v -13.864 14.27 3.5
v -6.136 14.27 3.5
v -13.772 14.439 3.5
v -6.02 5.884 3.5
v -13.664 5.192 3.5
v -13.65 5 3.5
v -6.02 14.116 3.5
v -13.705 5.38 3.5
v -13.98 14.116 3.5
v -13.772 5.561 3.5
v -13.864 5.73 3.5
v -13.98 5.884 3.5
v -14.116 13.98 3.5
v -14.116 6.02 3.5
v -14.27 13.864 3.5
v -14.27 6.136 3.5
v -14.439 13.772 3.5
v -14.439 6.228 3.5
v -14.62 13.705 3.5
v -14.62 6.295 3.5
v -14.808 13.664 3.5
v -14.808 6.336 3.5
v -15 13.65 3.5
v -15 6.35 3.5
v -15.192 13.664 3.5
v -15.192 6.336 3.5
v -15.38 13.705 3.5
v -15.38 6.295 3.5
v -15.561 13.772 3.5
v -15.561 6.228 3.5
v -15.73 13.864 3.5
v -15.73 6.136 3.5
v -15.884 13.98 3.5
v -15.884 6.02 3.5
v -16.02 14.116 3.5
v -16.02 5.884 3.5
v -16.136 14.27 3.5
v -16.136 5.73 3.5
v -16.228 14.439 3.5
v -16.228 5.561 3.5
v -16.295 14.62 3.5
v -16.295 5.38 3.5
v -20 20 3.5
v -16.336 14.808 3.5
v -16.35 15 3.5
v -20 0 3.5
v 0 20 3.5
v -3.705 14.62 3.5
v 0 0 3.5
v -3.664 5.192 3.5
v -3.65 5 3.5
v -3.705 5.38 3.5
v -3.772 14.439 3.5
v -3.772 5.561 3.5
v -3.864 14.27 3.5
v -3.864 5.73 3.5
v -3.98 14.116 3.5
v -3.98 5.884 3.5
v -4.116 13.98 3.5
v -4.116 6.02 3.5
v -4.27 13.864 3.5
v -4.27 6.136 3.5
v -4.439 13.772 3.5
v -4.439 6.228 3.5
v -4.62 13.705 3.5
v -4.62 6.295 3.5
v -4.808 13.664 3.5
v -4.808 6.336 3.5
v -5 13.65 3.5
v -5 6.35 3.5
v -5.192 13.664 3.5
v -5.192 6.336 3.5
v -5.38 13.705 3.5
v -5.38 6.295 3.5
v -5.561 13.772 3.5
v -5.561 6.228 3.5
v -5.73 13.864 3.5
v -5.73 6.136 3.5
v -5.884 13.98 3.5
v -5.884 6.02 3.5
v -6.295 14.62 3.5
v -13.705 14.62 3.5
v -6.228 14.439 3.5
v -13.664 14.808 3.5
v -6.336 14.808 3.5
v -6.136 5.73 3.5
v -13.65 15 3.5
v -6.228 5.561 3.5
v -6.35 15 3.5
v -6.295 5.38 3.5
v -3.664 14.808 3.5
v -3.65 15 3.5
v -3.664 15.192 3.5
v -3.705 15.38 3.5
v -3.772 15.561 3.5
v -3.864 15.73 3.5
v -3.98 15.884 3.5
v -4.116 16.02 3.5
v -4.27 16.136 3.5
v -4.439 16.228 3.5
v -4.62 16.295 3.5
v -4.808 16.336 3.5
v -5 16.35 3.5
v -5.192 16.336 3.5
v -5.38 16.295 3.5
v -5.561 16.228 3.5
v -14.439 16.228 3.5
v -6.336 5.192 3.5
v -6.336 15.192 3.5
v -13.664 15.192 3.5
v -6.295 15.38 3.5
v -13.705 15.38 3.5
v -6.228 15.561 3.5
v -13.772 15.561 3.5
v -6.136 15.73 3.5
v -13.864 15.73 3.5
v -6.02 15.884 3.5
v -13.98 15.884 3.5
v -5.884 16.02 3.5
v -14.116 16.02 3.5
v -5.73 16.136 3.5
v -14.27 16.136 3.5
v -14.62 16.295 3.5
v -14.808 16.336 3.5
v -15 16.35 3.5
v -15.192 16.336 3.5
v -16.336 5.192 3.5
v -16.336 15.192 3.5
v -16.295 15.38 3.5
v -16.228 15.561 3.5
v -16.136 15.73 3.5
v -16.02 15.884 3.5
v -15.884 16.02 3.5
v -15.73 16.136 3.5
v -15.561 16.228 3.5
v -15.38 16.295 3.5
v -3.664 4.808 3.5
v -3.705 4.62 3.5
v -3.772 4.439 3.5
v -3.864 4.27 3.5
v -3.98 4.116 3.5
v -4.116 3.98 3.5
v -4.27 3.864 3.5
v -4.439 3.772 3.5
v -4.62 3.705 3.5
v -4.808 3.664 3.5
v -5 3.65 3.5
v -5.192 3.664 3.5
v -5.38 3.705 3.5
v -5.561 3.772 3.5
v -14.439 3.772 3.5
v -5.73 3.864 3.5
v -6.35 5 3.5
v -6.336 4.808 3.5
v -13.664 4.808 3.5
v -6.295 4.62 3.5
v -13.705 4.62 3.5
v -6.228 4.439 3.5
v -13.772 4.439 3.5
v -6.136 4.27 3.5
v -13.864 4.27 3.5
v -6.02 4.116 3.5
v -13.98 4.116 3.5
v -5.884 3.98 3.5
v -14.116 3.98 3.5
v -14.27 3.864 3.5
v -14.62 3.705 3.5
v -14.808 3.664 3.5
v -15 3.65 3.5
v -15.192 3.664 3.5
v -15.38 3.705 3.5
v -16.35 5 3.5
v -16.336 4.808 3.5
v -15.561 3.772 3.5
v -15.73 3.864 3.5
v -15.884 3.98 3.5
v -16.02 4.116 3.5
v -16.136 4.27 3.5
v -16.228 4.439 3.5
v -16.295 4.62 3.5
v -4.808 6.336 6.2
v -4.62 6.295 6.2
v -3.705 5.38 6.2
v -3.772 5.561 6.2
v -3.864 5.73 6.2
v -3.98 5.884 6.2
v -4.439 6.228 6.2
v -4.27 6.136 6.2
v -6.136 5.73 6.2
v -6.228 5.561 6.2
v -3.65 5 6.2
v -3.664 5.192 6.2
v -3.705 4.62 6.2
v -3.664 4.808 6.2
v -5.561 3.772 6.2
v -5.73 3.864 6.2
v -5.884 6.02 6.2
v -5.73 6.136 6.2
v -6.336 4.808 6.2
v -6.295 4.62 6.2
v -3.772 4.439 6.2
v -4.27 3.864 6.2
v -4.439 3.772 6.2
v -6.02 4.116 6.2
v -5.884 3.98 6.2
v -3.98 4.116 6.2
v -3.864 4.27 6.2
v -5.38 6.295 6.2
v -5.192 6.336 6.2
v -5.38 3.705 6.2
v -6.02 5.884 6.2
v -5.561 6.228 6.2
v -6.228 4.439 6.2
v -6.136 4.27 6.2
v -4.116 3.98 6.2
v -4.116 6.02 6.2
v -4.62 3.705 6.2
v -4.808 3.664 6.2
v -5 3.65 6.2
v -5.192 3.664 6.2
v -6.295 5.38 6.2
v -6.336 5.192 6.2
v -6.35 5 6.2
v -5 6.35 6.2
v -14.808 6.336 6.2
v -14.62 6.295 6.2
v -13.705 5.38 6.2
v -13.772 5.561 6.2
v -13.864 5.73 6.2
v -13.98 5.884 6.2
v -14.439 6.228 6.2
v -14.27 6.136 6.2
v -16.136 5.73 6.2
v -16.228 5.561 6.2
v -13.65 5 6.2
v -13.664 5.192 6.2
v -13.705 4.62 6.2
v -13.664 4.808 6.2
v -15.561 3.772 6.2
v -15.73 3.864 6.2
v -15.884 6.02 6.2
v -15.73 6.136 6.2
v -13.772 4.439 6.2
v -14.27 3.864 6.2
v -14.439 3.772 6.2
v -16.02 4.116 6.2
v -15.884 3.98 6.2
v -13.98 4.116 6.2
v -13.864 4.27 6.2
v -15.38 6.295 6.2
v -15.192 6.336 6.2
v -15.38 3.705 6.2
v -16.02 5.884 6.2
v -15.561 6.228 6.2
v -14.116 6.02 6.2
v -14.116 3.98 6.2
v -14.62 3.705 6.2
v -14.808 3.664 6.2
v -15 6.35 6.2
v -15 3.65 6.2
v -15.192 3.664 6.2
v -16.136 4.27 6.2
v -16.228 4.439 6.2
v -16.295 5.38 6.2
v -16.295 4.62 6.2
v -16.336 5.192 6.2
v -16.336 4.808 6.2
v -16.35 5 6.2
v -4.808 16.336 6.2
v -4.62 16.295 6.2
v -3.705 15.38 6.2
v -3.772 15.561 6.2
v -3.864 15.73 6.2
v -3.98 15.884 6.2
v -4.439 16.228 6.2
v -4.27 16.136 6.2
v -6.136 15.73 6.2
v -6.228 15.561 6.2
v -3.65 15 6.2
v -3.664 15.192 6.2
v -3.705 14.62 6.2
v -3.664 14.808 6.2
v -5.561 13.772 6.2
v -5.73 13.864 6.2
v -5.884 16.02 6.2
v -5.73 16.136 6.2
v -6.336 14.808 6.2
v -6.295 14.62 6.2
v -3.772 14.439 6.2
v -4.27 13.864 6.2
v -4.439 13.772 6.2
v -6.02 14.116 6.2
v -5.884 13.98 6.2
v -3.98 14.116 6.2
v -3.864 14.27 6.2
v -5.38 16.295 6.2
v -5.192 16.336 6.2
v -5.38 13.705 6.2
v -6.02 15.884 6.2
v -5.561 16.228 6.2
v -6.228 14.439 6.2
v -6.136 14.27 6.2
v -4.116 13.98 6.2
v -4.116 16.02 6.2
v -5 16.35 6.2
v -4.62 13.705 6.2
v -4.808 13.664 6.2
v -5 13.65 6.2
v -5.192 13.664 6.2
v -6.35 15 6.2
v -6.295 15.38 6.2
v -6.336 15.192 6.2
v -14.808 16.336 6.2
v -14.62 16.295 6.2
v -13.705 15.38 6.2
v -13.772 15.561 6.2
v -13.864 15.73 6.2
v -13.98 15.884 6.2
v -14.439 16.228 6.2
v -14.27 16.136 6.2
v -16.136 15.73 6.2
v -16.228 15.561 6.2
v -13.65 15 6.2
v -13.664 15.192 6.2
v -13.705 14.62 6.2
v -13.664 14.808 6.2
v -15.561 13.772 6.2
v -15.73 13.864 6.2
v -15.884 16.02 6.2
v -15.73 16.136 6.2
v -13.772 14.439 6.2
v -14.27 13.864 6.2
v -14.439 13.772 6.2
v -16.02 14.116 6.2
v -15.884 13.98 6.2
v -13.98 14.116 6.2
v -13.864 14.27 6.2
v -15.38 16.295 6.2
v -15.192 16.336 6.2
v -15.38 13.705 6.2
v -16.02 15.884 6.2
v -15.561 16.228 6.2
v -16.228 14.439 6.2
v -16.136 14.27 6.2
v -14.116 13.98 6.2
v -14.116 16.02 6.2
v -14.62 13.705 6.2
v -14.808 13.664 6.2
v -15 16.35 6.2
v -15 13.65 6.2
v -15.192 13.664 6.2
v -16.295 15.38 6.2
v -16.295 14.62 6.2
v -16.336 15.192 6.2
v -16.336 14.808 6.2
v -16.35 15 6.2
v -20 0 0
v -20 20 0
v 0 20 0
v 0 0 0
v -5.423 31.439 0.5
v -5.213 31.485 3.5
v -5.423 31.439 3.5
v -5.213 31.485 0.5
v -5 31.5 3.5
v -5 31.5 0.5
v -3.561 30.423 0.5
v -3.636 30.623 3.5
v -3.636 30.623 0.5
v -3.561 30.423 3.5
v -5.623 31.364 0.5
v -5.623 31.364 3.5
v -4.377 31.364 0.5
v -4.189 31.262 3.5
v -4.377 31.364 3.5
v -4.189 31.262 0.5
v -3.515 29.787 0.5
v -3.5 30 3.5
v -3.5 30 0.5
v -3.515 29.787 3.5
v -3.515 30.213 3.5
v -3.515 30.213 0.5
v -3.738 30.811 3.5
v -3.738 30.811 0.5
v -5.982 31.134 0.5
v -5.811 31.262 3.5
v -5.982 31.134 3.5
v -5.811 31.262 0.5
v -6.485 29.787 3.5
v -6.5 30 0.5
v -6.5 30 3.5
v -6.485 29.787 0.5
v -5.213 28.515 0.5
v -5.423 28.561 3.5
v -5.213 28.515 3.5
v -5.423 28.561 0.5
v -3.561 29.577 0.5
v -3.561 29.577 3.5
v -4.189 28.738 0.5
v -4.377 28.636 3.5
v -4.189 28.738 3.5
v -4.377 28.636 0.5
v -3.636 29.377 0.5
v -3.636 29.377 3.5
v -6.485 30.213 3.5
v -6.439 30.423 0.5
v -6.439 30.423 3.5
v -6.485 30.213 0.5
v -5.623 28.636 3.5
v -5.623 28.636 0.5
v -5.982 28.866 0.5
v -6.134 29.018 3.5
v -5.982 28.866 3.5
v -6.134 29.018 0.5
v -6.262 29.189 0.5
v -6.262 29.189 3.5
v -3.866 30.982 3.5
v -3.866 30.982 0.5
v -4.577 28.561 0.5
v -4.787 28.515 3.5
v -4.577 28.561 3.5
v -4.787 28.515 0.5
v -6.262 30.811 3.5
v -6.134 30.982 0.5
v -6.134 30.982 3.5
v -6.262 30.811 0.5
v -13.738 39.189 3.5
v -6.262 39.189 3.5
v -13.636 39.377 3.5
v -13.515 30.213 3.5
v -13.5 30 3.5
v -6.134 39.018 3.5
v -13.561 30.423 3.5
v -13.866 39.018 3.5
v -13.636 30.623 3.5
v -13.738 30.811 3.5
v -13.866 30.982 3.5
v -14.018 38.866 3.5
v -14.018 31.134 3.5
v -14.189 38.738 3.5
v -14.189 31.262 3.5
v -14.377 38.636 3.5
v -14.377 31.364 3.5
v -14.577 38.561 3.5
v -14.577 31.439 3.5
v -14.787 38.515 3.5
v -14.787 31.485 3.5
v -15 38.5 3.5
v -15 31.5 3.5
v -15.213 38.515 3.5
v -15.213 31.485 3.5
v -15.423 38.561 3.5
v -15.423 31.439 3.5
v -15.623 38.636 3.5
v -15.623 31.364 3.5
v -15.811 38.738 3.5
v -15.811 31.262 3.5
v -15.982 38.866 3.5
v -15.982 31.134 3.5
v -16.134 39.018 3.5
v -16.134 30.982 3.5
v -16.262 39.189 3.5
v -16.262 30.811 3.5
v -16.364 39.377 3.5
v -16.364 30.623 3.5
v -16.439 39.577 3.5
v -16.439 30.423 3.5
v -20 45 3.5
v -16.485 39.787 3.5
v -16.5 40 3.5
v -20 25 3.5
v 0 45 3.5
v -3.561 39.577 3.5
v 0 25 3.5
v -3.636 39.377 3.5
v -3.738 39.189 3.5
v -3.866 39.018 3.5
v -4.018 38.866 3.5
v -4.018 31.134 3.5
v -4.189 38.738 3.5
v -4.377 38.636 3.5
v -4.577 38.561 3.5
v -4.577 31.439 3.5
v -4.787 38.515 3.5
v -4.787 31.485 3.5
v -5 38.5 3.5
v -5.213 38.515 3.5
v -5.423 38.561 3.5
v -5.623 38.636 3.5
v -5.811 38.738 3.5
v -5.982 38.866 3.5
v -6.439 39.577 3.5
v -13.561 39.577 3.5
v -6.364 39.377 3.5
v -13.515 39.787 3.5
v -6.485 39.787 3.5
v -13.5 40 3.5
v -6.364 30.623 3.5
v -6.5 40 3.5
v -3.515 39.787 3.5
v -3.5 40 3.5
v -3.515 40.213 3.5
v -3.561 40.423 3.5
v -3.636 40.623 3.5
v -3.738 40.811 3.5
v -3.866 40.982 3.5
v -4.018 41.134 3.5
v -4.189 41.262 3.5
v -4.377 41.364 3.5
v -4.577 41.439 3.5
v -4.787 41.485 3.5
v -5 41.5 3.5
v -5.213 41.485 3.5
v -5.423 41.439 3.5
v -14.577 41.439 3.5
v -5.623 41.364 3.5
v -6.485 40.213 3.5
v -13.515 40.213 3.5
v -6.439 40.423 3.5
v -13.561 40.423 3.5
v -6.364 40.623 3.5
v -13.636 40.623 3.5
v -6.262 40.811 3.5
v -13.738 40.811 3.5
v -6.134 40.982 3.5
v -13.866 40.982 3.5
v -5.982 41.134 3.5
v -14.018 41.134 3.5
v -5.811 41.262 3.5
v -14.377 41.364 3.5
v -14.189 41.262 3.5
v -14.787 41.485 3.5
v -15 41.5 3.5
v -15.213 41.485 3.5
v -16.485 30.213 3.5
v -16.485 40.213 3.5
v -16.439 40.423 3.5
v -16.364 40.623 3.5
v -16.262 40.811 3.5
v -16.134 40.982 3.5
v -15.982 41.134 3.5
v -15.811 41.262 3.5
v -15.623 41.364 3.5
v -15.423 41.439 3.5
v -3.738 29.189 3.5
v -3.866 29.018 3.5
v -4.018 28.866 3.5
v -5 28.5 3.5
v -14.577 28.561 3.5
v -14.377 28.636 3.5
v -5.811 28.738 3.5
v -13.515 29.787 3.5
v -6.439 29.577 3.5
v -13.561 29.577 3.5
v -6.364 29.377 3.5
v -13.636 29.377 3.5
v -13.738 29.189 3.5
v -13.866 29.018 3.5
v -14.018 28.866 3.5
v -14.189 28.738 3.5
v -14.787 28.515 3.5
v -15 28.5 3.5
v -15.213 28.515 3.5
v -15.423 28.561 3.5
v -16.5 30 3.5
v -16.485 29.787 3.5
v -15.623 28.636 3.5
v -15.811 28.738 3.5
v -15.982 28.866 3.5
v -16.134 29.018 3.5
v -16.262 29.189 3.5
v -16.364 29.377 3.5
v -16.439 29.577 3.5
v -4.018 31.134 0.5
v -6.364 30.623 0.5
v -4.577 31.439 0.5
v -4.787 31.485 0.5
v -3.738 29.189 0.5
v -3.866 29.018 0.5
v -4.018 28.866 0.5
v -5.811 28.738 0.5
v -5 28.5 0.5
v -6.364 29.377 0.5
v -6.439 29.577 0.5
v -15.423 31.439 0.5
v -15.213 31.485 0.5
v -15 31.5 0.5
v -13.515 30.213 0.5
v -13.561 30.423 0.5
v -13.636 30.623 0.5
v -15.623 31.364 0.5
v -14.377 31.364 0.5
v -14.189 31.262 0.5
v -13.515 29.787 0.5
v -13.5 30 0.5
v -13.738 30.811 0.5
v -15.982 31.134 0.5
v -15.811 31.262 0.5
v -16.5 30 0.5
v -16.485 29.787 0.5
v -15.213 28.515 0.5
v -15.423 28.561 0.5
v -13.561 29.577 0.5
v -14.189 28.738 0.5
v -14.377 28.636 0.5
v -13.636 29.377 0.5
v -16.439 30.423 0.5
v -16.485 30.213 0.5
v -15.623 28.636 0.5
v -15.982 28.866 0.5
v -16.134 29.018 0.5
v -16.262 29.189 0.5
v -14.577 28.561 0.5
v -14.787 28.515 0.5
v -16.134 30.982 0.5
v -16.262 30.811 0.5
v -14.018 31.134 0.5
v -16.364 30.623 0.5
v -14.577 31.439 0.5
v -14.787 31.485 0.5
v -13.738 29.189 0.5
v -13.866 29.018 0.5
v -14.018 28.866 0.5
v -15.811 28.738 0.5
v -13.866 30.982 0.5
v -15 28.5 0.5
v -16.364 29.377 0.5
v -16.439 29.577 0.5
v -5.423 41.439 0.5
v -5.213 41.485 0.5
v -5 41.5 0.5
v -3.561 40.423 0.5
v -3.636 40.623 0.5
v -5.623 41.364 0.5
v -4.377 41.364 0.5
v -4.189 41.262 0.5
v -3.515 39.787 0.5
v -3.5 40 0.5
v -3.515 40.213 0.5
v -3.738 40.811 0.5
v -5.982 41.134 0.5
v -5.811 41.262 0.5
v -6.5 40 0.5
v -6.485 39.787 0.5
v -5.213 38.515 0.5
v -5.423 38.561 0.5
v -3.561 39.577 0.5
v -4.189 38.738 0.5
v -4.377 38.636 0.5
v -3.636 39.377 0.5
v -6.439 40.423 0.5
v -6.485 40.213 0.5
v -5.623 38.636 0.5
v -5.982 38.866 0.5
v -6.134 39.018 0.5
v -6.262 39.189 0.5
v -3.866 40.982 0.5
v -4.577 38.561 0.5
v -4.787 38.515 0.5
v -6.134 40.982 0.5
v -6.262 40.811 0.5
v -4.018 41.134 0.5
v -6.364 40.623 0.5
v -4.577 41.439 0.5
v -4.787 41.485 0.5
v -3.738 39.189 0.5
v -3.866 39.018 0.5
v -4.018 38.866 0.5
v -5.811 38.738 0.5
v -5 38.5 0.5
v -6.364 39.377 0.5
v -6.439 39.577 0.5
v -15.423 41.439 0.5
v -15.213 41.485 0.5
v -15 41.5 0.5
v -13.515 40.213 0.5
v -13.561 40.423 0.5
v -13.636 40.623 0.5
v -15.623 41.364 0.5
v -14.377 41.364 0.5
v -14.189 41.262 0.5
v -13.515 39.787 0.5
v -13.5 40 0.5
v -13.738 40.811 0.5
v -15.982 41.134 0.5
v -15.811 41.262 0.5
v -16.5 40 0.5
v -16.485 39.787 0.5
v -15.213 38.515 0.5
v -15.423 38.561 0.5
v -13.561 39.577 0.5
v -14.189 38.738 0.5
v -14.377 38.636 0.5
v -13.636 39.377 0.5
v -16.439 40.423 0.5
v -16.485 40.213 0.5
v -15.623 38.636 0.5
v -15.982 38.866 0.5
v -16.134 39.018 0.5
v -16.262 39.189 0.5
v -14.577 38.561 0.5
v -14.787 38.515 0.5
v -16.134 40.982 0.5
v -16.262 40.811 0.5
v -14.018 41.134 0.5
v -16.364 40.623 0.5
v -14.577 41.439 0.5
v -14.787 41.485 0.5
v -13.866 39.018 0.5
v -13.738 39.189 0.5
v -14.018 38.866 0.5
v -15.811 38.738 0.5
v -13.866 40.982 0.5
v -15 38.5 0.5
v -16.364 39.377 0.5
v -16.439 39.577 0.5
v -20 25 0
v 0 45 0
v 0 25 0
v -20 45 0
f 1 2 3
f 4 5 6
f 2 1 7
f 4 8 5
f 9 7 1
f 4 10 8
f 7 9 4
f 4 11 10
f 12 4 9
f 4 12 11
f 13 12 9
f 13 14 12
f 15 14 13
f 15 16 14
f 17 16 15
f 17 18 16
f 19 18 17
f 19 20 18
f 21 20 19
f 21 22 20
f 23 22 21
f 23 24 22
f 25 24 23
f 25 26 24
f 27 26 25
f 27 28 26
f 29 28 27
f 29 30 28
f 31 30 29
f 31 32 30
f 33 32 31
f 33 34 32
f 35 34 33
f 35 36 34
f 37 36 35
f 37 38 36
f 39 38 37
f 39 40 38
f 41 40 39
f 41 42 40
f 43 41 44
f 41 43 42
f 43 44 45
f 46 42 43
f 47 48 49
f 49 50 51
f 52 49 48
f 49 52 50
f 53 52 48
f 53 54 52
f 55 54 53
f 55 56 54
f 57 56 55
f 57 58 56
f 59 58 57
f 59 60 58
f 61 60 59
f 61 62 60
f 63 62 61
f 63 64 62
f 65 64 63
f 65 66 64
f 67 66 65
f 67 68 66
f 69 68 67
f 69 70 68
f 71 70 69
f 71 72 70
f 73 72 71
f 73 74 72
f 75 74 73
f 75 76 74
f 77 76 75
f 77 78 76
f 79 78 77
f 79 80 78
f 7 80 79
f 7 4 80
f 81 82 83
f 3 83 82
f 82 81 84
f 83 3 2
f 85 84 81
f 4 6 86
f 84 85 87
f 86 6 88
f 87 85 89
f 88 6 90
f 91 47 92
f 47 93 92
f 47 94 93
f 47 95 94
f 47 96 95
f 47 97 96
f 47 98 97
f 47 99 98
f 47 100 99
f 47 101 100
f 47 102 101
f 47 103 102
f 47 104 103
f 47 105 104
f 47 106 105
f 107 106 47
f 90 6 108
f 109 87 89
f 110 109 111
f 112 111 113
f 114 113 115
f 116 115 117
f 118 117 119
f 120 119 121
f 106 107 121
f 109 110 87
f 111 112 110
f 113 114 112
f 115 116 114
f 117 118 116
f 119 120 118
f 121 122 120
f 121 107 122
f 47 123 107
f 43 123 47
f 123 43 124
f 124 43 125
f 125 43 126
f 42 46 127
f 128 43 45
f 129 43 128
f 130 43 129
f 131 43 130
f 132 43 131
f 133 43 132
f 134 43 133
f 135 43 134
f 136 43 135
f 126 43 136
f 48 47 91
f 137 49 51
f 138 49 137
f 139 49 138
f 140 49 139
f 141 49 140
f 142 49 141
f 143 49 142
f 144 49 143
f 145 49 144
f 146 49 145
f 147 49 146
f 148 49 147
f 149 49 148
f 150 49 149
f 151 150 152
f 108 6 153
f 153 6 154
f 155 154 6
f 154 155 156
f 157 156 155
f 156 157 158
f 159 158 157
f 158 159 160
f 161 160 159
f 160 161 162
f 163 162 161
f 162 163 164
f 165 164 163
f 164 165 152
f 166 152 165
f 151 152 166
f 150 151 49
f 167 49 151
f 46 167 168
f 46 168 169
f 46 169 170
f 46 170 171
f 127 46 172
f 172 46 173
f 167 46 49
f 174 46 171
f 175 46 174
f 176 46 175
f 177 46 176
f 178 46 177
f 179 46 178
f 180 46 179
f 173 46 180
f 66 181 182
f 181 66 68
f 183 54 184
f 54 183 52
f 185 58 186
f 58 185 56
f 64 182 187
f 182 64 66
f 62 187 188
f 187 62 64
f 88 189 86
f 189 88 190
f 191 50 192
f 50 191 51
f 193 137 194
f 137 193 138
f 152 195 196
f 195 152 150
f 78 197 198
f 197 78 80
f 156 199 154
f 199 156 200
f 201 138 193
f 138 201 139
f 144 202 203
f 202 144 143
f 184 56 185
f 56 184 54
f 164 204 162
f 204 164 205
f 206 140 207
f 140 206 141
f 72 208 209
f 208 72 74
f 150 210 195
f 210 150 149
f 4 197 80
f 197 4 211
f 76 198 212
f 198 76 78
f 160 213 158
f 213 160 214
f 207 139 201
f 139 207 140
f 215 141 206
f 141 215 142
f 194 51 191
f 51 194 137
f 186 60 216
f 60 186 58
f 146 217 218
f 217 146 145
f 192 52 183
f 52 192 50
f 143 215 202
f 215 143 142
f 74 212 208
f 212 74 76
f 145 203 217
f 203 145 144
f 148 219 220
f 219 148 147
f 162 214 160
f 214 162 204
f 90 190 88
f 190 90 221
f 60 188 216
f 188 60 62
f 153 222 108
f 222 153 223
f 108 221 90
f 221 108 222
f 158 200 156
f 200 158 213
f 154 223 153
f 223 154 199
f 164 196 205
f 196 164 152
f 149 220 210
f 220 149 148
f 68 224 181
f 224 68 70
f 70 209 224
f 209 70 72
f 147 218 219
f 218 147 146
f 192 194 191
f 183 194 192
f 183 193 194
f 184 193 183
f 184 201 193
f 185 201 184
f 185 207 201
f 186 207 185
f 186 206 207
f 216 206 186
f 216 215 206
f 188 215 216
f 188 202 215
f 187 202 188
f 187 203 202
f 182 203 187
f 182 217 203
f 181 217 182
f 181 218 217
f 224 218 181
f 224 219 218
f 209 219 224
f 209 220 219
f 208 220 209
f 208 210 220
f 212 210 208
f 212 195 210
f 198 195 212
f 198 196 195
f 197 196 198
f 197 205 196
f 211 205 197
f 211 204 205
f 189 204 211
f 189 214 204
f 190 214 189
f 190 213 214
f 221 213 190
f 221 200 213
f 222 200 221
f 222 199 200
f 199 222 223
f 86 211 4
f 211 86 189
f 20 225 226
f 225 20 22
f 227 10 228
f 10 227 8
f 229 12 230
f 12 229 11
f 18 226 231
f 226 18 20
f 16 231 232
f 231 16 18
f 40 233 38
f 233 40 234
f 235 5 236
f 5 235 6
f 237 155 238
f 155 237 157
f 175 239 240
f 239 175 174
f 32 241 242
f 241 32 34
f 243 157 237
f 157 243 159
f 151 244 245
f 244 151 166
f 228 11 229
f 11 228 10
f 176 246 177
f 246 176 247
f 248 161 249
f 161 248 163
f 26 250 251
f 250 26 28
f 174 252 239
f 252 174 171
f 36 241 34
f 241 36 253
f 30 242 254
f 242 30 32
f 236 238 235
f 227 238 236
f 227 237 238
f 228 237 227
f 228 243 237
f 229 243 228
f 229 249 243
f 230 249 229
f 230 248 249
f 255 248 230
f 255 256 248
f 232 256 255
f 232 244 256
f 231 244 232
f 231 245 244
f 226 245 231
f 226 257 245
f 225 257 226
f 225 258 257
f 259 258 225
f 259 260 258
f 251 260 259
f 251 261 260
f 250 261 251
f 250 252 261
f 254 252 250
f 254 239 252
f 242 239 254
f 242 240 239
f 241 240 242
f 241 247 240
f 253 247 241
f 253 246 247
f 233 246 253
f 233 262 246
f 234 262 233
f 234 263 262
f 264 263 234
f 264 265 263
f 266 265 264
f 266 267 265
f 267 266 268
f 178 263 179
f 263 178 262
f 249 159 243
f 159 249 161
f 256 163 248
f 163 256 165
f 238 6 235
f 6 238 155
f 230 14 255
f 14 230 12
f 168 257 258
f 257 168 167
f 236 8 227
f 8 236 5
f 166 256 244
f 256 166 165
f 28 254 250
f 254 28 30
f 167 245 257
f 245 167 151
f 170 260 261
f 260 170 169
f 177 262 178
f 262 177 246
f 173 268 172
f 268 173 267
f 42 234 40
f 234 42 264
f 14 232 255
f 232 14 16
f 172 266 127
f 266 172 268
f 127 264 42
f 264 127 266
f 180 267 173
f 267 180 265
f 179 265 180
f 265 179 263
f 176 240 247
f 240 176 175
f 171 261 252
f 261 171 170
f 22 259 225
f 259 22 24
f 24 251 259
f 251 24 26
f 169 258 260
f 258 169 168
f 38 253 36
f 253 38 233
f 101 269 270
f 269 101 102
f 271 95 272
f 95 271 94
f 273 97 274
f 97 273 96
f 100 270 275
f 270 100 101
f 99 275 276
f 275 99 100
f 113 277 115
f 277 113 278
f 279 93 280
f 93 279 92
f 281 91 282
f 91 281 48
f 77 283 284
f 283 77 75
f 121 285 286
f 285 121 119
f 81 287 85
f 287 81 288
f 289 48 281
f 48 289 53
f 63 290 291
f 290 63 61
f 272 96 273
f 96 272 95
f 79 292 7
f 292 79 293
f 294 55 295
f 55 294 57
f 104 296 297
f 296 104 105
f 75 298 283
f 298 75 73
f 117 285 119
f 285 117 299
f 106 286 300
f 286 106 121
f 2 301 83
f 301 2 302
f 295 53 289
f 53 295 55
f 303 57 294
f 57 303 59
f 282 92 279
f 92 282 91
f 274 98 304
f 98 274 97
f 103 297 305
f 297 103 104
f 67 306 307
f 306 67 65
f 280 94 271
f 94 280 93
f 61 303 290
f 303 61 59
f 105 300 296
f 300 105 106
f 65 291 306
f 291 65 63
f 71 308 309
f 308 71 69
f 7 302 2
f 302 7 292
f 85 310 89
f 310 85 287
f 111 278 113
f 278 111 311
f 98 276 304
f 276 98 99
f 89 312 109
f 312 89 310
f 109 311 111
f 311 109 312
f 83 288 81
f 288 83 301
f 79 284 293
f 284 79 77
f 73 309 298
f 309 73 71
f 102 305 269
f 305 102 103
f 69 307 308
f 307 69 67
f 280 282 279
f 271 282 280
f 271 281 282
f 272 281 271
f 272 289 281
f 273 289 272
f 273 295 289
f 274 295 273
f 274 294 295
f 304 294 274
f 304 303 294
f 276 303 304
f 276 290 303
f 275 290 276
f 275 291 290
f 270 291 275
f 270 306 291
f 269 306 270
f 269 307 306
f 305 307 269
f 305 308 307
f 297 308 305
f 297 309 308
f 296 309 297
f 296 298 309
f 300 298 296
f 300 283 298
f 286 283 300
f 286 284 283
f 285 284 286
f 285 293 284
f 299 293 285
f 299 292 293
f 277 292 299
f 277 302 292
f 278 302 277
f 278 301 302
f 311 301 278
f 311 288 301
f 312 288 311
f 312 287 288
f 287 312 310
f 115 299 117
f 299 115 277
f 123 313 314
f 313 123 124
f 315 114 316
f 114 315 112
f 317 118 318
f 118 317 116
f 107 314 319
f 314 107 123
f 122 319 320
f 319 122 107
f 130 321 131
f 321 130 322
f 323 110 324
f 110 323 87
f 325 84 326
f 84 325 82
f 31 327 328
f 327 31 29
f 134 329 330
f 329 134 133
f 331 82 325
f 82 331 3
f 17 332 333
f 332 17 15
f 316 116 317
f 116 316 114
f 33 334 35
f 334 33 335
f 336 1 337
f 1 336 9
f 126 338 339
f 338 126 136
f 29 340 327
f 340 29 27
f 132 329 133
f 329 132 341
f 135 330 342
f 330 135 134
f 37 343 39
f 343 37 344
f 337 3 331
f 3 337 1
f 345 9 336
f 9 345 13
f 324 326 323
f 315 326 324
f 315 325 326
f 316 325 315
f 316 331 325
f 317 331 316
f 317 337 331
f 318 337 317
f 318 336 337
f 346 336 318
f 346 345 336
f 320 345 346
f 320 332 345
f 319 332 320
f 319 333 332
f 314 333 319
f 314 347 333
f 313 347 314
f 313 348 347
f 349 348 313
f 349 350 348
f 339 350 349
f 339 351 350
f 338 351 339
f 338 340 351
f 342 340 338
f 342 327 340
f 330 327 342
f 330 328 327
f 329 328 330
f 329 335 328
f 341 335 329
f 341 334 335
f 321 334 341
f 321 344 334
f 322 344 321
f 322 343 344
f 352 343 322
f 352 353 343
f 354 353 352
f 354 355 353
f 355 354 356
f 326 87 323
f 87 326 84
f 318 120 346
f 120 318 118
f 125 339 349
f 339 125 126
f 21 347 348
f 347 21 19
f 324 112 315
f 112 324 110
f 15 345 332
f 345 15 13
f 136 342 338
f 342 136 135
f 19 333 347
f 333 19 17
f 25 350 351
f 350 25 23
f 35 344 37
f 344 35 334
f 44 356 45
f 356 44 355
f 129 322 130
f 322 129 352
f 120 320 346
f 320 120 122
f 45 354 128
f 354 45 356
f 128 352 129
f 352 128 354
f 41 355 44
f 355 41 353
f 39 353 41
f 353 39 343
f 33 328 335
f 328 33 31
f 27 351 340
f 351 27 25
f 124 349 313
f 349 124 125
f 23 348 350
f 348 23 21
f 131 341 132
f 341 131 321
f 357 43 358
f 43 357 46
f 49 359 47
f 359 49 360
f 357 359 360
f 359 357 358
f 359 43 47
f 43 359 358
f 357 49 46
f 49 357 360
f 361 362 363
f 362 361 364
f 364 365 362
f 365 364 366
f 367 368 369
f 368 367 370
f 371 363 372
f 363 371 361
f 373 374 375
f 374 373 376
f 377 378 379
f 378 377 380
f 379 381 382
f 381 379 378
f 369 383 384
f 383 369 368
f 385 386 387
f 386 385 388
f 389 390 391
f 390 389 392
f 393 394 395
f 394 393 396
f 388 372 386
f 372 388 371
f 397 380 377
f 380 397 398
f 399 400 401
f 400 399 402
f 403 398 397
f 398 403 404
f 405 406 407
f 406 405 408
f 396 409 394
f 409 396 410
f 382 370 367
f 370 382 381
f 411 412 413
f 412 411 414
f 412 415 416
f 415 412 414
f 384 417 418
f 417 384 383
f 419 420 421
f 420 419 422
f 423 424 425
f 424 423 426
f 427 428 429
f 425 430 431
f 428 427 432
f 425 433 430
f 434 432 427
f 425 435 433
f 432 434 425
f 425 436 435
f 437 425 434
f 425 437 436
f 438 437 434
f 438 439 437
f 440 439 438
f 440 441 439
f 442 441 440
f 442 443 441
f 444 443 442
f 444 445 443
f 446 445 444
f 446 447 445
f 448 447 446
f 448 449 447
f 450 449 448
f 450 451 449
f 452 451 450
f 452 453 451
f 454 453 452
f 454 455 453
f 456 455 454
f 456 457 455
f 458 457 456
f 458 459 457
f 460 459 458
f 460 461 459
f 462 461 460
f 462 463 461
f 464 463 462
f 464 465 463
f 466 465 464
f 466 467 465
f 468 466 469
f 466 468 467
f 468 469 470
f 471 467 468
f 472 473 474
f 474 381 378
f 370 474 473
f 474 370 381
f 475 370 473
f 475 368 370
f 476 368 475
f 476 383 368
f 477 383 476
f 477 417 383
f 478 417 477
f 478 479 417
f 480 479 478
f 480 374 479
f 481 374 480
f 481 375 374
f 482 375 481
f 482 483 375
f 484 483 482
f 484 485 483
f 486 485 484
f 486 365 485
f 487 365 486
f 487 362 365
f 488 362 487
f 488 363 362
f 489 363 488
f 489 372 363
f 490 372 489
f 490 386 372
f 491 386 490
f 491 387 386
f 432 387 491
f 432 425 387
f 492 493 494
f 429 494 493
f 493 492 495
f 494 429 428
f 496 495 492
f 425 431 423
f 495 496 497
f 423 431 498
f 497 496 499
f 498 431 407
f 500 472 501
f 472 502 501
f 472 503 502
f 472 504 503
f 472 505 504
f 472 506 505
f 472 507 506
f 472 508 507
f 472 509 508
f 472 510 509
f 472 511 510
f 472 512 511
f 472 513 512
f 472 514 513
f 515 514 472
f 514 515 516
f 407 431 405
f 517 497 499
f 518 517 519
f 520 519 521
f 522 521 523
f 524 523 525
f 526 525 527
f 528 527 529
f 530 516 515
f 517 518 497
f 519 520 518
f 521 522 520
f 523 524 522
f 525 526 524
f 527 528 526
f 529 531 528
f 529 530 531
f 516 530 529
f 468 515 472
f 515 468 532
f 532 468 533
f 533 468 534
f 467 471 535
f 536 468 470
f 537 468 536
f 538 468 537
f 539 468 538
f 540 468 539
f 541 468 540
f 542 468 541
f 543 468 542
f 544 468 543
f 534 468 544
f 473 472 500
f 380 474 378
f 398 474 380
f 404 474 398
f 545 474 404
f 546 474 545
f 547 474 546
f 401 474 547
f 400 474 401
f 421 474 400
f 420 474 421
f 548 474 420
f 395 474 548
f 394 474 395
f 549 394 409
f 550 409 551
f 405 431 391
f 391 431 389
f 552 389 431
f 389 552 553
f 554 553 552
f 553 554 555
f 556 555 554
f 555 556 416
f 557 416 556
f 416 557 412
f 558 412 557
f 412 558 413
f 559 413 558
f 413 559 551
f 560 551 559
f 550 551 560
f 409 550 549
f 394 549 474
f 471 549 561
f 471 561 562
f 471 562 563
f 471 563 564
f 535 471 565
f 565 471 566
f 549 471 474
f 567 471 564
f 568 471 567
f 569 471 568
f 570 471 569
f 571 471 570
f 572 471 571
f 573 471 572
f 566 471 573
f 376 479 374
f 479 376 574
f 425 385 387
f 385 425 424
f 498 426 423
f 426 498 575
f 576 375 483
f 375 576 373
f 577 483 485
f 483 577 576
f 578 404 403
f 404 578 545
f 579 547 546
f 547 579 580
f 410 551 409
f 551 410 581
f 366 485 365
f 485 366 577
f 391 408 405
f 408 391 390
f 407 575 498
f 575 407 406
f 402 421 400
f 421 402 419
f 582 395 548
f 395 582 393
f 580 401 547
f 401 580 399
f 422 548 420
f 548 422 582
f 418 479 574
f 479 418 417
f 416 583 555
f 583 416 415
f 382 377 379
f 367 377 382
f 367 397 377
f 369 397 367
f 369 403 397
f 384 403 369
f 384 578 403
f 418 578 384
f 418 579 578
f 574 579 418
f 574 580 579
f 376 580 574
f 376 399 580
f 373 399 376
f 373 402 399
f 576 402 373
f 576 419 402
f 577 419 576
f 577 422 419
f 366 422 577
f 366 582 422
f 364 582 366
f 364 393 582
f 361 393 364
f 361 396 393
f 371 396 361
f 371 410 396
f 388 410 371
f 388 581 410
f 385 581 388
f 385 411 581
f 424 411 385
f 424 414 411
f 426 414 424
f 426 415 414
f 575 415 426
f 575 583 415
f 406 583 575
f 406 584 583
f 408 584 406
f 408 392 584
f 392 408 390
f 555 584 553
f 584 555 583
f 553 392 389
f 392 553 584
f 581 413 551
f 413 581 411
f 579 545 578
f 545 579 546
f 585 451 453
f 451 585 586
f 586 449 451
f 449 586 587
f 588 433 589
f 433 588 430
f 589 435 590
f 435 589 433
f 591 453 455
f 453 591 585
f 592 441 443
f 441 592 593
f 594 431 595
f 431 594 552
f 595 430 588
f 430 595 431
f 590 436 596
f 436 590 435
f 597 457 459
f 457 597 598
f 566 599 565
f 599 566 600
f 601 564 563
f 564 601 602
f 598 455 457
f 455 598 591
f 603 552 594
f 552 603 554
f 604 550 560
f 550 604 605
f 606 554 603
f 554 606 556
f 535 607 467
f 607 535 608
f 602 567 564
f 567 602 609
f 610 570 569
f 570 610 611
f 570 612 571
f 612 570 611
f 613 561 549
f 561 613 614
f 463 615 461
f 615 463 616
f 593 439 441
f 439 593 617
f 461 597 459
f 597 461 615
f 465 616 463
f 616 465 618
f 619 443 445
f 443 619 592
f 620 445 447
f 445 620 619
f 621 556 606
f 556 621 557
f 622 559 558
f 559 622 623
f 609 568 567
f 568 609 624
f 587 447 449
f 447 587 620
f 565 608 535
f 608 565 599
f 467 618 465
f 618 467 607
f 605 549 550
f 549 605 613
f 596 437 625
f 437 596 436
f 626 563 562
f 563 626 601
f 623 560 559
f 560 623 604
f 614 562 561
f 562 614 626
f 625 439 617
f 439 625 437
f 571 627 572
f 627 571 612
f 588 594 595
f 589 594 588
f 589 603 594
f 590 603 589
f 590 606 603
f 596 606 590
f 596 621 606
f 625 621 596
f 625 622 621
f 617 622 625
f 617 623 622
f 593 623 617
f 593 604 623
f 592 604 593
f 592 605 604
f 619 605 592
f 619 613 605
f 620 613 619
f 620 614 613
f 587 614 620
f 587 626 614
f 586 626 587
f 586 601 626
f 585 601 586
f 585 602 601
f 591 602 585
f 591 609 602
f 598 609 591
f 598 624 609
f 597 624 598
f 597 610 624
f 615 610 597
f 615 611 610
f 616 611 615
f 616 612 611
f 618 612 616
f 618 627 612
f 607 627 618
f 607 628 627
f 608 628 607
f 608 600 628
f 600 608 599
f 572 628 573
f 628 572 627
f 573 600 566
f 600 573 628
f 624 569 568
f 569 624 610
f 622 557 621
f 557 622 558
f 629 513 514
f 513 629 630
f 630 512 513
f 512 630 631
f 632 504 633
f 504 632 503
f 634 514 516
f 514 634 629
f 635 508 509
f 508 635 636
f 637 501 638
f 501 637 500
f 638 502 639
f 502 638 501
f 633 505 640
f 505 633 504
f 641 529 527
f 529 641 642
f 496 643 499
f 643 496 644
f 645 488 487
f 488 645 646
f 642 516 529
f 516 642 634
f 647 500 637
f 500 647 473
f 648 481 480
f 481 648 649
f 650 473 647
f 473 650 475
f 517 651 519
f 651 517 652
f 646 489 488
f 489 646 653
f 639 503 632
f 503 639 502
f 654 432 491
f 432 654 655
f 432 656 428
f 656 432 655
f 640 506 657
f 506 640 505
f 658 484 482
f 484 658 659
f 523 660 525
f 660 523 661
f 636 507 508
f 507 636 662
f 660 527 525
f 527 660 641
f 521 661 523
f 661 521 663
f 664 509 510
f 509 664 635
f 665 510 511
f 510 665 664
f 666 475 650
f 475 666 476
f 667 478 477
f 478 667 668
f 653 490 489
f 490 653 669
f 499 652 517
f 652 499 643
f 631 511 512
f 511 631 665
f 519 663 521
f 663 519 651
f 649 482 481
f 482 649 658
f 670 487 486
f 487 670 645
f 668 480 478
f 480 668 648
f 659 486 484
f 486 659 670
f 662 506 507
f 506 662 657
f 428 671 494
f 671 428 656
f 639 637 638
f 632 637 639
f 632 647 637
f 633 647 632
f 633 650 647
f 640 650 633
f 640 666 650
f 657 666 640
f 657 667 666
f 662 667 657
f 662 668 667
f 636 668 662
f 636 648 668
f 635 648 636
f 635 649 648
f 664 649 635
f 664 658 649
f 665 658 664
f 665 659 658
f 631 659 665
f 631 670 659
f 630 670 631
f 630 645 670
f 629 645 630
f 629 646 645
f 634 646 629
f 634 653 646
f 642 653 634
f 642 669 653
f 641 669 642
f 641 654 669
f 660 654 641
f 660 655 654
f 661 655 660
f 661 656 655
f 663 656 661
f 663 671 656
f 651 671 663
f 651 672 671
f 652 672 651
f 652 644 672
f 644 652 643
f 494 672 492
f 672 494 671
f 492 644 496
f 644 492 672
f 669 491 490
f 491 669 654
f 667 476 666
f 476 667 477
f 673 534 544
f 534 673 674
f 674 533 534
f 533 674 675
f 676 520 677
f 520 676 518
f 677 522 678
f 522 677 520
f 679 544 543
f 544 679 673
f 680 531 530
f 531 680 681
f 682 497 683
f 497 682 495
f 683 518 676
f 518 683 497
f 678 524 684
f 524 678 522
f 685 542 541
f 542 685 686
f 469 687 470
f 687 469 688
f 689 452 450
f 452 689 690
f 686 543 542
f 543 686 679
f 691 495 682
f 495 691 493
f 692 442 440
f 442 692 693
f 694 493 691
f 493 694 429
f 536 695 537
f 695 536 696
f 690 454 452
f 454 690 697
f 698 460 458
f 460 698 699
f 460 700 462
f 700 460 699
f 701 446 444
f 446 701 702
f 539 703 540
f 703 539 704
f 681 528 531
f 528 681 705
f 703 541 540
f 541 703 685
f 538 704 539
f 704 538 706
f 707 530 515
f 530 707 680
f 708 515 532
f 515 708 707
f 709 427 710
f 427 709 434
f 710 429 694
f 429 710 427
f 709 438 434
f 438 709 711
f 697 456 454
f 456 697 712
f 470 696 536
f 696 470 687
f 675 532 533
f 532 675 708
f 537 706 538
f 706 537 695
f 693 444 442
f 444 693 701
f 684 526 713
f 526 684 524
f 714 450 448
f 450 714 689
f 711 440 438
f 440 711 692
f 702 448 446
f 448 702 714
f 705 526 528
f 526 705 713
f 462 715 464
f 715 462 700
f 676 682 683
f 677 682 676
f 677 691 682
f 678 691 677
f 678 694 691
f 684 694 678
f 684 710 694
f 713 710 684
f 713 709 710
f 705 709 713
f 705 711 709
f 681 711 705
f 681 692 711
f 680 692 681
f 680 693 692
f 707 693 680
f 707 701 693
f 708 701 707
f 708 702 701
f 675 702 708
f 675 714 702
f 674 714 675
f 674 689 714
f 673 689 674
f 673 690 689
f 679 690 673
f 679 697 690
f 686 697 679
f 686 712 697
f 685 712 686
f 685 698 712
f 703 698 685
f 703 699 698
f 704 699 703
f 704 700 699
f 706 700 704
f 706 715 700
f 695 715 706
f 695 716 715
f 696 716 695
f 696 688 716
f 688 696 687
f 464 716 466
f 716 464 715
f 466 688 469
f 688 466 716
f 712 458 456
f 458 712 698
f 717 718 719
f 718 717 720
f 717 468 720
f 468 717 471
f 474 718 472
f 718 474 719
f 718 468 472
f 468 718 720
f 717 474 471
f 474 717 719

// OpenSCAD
// file: mold.scad
// This file contains two modules
// Each module creates one half of a general purpose mold
// Use difference() to create a mold for custom shapes

// Mold A has pegs which snap into Mold B
// Pegs occur in a 10 mm grid, centered within the mold; each peg is 3mm long
// If your mold is smaller than this, no pegs will be generated

// The length, width, and height refer to the total size of both halves

module moldA(length, width, height)
{
    // Create a cube in the shape half of our mold
    cube([length / 2, width, height]);

    // Compute the maximum number of pegs in each axis
    yMax = ceil(width / 10);
    zMax = ceil(height / 10);

    // Translate the pegs to center them on the mold
    translate([0, -(width / yMax) / 2, -(height / zMax) / 2])
    {
        // Loop over the y and z coordinates
        for(y = [1 : yMax])
        {
            for(z = [1 : zMax])
            {
                // Create a peg based on the current loop coordinates
                translate([length / 2, y * (width / yMax), z * (height / zMax)])
                rotate([0, 90, 0])
                cylinder(d = 2.7, h = 2.7);
            }
        }
    }
}

module moldB(length, width, height)
{
    // Get the difference of the pegs in the mold
    difference()
    {
        translate([length / 2, 0, 0])
        cube([length / 2, width, height]);

        yMax = ceil(width / 10);
        zMax = ceil(height / 10);

        translate([0, -(width / yMax) / 2, -(height / zMax) / 2])
        {
            for(y = [1 : yMax])
            {
                for(z = [1 : zMax])
                {
                    translate([length / 2, y * (width / yMax), z * (height / zMax)])
                    rotate([0, 90, 0])
                    cylinder(d = 3, h = 3);
                }
            }
        }
    }
}

translate([-5, 0, 0]) moldA(25, 25, 50);
translate([5, 0, 0]) moldB(25, 25, 50);

$fn = 44;
// main file
// A small test mold to check if the pins fit together nicely

use <mold.scad>;

rotate([0, -90, 0])
{
    moldA(7, 20, 20);
    
    translate([7, 25, 0]) mirror()
    {
        moldB(7, 20, 20);
    }
}
